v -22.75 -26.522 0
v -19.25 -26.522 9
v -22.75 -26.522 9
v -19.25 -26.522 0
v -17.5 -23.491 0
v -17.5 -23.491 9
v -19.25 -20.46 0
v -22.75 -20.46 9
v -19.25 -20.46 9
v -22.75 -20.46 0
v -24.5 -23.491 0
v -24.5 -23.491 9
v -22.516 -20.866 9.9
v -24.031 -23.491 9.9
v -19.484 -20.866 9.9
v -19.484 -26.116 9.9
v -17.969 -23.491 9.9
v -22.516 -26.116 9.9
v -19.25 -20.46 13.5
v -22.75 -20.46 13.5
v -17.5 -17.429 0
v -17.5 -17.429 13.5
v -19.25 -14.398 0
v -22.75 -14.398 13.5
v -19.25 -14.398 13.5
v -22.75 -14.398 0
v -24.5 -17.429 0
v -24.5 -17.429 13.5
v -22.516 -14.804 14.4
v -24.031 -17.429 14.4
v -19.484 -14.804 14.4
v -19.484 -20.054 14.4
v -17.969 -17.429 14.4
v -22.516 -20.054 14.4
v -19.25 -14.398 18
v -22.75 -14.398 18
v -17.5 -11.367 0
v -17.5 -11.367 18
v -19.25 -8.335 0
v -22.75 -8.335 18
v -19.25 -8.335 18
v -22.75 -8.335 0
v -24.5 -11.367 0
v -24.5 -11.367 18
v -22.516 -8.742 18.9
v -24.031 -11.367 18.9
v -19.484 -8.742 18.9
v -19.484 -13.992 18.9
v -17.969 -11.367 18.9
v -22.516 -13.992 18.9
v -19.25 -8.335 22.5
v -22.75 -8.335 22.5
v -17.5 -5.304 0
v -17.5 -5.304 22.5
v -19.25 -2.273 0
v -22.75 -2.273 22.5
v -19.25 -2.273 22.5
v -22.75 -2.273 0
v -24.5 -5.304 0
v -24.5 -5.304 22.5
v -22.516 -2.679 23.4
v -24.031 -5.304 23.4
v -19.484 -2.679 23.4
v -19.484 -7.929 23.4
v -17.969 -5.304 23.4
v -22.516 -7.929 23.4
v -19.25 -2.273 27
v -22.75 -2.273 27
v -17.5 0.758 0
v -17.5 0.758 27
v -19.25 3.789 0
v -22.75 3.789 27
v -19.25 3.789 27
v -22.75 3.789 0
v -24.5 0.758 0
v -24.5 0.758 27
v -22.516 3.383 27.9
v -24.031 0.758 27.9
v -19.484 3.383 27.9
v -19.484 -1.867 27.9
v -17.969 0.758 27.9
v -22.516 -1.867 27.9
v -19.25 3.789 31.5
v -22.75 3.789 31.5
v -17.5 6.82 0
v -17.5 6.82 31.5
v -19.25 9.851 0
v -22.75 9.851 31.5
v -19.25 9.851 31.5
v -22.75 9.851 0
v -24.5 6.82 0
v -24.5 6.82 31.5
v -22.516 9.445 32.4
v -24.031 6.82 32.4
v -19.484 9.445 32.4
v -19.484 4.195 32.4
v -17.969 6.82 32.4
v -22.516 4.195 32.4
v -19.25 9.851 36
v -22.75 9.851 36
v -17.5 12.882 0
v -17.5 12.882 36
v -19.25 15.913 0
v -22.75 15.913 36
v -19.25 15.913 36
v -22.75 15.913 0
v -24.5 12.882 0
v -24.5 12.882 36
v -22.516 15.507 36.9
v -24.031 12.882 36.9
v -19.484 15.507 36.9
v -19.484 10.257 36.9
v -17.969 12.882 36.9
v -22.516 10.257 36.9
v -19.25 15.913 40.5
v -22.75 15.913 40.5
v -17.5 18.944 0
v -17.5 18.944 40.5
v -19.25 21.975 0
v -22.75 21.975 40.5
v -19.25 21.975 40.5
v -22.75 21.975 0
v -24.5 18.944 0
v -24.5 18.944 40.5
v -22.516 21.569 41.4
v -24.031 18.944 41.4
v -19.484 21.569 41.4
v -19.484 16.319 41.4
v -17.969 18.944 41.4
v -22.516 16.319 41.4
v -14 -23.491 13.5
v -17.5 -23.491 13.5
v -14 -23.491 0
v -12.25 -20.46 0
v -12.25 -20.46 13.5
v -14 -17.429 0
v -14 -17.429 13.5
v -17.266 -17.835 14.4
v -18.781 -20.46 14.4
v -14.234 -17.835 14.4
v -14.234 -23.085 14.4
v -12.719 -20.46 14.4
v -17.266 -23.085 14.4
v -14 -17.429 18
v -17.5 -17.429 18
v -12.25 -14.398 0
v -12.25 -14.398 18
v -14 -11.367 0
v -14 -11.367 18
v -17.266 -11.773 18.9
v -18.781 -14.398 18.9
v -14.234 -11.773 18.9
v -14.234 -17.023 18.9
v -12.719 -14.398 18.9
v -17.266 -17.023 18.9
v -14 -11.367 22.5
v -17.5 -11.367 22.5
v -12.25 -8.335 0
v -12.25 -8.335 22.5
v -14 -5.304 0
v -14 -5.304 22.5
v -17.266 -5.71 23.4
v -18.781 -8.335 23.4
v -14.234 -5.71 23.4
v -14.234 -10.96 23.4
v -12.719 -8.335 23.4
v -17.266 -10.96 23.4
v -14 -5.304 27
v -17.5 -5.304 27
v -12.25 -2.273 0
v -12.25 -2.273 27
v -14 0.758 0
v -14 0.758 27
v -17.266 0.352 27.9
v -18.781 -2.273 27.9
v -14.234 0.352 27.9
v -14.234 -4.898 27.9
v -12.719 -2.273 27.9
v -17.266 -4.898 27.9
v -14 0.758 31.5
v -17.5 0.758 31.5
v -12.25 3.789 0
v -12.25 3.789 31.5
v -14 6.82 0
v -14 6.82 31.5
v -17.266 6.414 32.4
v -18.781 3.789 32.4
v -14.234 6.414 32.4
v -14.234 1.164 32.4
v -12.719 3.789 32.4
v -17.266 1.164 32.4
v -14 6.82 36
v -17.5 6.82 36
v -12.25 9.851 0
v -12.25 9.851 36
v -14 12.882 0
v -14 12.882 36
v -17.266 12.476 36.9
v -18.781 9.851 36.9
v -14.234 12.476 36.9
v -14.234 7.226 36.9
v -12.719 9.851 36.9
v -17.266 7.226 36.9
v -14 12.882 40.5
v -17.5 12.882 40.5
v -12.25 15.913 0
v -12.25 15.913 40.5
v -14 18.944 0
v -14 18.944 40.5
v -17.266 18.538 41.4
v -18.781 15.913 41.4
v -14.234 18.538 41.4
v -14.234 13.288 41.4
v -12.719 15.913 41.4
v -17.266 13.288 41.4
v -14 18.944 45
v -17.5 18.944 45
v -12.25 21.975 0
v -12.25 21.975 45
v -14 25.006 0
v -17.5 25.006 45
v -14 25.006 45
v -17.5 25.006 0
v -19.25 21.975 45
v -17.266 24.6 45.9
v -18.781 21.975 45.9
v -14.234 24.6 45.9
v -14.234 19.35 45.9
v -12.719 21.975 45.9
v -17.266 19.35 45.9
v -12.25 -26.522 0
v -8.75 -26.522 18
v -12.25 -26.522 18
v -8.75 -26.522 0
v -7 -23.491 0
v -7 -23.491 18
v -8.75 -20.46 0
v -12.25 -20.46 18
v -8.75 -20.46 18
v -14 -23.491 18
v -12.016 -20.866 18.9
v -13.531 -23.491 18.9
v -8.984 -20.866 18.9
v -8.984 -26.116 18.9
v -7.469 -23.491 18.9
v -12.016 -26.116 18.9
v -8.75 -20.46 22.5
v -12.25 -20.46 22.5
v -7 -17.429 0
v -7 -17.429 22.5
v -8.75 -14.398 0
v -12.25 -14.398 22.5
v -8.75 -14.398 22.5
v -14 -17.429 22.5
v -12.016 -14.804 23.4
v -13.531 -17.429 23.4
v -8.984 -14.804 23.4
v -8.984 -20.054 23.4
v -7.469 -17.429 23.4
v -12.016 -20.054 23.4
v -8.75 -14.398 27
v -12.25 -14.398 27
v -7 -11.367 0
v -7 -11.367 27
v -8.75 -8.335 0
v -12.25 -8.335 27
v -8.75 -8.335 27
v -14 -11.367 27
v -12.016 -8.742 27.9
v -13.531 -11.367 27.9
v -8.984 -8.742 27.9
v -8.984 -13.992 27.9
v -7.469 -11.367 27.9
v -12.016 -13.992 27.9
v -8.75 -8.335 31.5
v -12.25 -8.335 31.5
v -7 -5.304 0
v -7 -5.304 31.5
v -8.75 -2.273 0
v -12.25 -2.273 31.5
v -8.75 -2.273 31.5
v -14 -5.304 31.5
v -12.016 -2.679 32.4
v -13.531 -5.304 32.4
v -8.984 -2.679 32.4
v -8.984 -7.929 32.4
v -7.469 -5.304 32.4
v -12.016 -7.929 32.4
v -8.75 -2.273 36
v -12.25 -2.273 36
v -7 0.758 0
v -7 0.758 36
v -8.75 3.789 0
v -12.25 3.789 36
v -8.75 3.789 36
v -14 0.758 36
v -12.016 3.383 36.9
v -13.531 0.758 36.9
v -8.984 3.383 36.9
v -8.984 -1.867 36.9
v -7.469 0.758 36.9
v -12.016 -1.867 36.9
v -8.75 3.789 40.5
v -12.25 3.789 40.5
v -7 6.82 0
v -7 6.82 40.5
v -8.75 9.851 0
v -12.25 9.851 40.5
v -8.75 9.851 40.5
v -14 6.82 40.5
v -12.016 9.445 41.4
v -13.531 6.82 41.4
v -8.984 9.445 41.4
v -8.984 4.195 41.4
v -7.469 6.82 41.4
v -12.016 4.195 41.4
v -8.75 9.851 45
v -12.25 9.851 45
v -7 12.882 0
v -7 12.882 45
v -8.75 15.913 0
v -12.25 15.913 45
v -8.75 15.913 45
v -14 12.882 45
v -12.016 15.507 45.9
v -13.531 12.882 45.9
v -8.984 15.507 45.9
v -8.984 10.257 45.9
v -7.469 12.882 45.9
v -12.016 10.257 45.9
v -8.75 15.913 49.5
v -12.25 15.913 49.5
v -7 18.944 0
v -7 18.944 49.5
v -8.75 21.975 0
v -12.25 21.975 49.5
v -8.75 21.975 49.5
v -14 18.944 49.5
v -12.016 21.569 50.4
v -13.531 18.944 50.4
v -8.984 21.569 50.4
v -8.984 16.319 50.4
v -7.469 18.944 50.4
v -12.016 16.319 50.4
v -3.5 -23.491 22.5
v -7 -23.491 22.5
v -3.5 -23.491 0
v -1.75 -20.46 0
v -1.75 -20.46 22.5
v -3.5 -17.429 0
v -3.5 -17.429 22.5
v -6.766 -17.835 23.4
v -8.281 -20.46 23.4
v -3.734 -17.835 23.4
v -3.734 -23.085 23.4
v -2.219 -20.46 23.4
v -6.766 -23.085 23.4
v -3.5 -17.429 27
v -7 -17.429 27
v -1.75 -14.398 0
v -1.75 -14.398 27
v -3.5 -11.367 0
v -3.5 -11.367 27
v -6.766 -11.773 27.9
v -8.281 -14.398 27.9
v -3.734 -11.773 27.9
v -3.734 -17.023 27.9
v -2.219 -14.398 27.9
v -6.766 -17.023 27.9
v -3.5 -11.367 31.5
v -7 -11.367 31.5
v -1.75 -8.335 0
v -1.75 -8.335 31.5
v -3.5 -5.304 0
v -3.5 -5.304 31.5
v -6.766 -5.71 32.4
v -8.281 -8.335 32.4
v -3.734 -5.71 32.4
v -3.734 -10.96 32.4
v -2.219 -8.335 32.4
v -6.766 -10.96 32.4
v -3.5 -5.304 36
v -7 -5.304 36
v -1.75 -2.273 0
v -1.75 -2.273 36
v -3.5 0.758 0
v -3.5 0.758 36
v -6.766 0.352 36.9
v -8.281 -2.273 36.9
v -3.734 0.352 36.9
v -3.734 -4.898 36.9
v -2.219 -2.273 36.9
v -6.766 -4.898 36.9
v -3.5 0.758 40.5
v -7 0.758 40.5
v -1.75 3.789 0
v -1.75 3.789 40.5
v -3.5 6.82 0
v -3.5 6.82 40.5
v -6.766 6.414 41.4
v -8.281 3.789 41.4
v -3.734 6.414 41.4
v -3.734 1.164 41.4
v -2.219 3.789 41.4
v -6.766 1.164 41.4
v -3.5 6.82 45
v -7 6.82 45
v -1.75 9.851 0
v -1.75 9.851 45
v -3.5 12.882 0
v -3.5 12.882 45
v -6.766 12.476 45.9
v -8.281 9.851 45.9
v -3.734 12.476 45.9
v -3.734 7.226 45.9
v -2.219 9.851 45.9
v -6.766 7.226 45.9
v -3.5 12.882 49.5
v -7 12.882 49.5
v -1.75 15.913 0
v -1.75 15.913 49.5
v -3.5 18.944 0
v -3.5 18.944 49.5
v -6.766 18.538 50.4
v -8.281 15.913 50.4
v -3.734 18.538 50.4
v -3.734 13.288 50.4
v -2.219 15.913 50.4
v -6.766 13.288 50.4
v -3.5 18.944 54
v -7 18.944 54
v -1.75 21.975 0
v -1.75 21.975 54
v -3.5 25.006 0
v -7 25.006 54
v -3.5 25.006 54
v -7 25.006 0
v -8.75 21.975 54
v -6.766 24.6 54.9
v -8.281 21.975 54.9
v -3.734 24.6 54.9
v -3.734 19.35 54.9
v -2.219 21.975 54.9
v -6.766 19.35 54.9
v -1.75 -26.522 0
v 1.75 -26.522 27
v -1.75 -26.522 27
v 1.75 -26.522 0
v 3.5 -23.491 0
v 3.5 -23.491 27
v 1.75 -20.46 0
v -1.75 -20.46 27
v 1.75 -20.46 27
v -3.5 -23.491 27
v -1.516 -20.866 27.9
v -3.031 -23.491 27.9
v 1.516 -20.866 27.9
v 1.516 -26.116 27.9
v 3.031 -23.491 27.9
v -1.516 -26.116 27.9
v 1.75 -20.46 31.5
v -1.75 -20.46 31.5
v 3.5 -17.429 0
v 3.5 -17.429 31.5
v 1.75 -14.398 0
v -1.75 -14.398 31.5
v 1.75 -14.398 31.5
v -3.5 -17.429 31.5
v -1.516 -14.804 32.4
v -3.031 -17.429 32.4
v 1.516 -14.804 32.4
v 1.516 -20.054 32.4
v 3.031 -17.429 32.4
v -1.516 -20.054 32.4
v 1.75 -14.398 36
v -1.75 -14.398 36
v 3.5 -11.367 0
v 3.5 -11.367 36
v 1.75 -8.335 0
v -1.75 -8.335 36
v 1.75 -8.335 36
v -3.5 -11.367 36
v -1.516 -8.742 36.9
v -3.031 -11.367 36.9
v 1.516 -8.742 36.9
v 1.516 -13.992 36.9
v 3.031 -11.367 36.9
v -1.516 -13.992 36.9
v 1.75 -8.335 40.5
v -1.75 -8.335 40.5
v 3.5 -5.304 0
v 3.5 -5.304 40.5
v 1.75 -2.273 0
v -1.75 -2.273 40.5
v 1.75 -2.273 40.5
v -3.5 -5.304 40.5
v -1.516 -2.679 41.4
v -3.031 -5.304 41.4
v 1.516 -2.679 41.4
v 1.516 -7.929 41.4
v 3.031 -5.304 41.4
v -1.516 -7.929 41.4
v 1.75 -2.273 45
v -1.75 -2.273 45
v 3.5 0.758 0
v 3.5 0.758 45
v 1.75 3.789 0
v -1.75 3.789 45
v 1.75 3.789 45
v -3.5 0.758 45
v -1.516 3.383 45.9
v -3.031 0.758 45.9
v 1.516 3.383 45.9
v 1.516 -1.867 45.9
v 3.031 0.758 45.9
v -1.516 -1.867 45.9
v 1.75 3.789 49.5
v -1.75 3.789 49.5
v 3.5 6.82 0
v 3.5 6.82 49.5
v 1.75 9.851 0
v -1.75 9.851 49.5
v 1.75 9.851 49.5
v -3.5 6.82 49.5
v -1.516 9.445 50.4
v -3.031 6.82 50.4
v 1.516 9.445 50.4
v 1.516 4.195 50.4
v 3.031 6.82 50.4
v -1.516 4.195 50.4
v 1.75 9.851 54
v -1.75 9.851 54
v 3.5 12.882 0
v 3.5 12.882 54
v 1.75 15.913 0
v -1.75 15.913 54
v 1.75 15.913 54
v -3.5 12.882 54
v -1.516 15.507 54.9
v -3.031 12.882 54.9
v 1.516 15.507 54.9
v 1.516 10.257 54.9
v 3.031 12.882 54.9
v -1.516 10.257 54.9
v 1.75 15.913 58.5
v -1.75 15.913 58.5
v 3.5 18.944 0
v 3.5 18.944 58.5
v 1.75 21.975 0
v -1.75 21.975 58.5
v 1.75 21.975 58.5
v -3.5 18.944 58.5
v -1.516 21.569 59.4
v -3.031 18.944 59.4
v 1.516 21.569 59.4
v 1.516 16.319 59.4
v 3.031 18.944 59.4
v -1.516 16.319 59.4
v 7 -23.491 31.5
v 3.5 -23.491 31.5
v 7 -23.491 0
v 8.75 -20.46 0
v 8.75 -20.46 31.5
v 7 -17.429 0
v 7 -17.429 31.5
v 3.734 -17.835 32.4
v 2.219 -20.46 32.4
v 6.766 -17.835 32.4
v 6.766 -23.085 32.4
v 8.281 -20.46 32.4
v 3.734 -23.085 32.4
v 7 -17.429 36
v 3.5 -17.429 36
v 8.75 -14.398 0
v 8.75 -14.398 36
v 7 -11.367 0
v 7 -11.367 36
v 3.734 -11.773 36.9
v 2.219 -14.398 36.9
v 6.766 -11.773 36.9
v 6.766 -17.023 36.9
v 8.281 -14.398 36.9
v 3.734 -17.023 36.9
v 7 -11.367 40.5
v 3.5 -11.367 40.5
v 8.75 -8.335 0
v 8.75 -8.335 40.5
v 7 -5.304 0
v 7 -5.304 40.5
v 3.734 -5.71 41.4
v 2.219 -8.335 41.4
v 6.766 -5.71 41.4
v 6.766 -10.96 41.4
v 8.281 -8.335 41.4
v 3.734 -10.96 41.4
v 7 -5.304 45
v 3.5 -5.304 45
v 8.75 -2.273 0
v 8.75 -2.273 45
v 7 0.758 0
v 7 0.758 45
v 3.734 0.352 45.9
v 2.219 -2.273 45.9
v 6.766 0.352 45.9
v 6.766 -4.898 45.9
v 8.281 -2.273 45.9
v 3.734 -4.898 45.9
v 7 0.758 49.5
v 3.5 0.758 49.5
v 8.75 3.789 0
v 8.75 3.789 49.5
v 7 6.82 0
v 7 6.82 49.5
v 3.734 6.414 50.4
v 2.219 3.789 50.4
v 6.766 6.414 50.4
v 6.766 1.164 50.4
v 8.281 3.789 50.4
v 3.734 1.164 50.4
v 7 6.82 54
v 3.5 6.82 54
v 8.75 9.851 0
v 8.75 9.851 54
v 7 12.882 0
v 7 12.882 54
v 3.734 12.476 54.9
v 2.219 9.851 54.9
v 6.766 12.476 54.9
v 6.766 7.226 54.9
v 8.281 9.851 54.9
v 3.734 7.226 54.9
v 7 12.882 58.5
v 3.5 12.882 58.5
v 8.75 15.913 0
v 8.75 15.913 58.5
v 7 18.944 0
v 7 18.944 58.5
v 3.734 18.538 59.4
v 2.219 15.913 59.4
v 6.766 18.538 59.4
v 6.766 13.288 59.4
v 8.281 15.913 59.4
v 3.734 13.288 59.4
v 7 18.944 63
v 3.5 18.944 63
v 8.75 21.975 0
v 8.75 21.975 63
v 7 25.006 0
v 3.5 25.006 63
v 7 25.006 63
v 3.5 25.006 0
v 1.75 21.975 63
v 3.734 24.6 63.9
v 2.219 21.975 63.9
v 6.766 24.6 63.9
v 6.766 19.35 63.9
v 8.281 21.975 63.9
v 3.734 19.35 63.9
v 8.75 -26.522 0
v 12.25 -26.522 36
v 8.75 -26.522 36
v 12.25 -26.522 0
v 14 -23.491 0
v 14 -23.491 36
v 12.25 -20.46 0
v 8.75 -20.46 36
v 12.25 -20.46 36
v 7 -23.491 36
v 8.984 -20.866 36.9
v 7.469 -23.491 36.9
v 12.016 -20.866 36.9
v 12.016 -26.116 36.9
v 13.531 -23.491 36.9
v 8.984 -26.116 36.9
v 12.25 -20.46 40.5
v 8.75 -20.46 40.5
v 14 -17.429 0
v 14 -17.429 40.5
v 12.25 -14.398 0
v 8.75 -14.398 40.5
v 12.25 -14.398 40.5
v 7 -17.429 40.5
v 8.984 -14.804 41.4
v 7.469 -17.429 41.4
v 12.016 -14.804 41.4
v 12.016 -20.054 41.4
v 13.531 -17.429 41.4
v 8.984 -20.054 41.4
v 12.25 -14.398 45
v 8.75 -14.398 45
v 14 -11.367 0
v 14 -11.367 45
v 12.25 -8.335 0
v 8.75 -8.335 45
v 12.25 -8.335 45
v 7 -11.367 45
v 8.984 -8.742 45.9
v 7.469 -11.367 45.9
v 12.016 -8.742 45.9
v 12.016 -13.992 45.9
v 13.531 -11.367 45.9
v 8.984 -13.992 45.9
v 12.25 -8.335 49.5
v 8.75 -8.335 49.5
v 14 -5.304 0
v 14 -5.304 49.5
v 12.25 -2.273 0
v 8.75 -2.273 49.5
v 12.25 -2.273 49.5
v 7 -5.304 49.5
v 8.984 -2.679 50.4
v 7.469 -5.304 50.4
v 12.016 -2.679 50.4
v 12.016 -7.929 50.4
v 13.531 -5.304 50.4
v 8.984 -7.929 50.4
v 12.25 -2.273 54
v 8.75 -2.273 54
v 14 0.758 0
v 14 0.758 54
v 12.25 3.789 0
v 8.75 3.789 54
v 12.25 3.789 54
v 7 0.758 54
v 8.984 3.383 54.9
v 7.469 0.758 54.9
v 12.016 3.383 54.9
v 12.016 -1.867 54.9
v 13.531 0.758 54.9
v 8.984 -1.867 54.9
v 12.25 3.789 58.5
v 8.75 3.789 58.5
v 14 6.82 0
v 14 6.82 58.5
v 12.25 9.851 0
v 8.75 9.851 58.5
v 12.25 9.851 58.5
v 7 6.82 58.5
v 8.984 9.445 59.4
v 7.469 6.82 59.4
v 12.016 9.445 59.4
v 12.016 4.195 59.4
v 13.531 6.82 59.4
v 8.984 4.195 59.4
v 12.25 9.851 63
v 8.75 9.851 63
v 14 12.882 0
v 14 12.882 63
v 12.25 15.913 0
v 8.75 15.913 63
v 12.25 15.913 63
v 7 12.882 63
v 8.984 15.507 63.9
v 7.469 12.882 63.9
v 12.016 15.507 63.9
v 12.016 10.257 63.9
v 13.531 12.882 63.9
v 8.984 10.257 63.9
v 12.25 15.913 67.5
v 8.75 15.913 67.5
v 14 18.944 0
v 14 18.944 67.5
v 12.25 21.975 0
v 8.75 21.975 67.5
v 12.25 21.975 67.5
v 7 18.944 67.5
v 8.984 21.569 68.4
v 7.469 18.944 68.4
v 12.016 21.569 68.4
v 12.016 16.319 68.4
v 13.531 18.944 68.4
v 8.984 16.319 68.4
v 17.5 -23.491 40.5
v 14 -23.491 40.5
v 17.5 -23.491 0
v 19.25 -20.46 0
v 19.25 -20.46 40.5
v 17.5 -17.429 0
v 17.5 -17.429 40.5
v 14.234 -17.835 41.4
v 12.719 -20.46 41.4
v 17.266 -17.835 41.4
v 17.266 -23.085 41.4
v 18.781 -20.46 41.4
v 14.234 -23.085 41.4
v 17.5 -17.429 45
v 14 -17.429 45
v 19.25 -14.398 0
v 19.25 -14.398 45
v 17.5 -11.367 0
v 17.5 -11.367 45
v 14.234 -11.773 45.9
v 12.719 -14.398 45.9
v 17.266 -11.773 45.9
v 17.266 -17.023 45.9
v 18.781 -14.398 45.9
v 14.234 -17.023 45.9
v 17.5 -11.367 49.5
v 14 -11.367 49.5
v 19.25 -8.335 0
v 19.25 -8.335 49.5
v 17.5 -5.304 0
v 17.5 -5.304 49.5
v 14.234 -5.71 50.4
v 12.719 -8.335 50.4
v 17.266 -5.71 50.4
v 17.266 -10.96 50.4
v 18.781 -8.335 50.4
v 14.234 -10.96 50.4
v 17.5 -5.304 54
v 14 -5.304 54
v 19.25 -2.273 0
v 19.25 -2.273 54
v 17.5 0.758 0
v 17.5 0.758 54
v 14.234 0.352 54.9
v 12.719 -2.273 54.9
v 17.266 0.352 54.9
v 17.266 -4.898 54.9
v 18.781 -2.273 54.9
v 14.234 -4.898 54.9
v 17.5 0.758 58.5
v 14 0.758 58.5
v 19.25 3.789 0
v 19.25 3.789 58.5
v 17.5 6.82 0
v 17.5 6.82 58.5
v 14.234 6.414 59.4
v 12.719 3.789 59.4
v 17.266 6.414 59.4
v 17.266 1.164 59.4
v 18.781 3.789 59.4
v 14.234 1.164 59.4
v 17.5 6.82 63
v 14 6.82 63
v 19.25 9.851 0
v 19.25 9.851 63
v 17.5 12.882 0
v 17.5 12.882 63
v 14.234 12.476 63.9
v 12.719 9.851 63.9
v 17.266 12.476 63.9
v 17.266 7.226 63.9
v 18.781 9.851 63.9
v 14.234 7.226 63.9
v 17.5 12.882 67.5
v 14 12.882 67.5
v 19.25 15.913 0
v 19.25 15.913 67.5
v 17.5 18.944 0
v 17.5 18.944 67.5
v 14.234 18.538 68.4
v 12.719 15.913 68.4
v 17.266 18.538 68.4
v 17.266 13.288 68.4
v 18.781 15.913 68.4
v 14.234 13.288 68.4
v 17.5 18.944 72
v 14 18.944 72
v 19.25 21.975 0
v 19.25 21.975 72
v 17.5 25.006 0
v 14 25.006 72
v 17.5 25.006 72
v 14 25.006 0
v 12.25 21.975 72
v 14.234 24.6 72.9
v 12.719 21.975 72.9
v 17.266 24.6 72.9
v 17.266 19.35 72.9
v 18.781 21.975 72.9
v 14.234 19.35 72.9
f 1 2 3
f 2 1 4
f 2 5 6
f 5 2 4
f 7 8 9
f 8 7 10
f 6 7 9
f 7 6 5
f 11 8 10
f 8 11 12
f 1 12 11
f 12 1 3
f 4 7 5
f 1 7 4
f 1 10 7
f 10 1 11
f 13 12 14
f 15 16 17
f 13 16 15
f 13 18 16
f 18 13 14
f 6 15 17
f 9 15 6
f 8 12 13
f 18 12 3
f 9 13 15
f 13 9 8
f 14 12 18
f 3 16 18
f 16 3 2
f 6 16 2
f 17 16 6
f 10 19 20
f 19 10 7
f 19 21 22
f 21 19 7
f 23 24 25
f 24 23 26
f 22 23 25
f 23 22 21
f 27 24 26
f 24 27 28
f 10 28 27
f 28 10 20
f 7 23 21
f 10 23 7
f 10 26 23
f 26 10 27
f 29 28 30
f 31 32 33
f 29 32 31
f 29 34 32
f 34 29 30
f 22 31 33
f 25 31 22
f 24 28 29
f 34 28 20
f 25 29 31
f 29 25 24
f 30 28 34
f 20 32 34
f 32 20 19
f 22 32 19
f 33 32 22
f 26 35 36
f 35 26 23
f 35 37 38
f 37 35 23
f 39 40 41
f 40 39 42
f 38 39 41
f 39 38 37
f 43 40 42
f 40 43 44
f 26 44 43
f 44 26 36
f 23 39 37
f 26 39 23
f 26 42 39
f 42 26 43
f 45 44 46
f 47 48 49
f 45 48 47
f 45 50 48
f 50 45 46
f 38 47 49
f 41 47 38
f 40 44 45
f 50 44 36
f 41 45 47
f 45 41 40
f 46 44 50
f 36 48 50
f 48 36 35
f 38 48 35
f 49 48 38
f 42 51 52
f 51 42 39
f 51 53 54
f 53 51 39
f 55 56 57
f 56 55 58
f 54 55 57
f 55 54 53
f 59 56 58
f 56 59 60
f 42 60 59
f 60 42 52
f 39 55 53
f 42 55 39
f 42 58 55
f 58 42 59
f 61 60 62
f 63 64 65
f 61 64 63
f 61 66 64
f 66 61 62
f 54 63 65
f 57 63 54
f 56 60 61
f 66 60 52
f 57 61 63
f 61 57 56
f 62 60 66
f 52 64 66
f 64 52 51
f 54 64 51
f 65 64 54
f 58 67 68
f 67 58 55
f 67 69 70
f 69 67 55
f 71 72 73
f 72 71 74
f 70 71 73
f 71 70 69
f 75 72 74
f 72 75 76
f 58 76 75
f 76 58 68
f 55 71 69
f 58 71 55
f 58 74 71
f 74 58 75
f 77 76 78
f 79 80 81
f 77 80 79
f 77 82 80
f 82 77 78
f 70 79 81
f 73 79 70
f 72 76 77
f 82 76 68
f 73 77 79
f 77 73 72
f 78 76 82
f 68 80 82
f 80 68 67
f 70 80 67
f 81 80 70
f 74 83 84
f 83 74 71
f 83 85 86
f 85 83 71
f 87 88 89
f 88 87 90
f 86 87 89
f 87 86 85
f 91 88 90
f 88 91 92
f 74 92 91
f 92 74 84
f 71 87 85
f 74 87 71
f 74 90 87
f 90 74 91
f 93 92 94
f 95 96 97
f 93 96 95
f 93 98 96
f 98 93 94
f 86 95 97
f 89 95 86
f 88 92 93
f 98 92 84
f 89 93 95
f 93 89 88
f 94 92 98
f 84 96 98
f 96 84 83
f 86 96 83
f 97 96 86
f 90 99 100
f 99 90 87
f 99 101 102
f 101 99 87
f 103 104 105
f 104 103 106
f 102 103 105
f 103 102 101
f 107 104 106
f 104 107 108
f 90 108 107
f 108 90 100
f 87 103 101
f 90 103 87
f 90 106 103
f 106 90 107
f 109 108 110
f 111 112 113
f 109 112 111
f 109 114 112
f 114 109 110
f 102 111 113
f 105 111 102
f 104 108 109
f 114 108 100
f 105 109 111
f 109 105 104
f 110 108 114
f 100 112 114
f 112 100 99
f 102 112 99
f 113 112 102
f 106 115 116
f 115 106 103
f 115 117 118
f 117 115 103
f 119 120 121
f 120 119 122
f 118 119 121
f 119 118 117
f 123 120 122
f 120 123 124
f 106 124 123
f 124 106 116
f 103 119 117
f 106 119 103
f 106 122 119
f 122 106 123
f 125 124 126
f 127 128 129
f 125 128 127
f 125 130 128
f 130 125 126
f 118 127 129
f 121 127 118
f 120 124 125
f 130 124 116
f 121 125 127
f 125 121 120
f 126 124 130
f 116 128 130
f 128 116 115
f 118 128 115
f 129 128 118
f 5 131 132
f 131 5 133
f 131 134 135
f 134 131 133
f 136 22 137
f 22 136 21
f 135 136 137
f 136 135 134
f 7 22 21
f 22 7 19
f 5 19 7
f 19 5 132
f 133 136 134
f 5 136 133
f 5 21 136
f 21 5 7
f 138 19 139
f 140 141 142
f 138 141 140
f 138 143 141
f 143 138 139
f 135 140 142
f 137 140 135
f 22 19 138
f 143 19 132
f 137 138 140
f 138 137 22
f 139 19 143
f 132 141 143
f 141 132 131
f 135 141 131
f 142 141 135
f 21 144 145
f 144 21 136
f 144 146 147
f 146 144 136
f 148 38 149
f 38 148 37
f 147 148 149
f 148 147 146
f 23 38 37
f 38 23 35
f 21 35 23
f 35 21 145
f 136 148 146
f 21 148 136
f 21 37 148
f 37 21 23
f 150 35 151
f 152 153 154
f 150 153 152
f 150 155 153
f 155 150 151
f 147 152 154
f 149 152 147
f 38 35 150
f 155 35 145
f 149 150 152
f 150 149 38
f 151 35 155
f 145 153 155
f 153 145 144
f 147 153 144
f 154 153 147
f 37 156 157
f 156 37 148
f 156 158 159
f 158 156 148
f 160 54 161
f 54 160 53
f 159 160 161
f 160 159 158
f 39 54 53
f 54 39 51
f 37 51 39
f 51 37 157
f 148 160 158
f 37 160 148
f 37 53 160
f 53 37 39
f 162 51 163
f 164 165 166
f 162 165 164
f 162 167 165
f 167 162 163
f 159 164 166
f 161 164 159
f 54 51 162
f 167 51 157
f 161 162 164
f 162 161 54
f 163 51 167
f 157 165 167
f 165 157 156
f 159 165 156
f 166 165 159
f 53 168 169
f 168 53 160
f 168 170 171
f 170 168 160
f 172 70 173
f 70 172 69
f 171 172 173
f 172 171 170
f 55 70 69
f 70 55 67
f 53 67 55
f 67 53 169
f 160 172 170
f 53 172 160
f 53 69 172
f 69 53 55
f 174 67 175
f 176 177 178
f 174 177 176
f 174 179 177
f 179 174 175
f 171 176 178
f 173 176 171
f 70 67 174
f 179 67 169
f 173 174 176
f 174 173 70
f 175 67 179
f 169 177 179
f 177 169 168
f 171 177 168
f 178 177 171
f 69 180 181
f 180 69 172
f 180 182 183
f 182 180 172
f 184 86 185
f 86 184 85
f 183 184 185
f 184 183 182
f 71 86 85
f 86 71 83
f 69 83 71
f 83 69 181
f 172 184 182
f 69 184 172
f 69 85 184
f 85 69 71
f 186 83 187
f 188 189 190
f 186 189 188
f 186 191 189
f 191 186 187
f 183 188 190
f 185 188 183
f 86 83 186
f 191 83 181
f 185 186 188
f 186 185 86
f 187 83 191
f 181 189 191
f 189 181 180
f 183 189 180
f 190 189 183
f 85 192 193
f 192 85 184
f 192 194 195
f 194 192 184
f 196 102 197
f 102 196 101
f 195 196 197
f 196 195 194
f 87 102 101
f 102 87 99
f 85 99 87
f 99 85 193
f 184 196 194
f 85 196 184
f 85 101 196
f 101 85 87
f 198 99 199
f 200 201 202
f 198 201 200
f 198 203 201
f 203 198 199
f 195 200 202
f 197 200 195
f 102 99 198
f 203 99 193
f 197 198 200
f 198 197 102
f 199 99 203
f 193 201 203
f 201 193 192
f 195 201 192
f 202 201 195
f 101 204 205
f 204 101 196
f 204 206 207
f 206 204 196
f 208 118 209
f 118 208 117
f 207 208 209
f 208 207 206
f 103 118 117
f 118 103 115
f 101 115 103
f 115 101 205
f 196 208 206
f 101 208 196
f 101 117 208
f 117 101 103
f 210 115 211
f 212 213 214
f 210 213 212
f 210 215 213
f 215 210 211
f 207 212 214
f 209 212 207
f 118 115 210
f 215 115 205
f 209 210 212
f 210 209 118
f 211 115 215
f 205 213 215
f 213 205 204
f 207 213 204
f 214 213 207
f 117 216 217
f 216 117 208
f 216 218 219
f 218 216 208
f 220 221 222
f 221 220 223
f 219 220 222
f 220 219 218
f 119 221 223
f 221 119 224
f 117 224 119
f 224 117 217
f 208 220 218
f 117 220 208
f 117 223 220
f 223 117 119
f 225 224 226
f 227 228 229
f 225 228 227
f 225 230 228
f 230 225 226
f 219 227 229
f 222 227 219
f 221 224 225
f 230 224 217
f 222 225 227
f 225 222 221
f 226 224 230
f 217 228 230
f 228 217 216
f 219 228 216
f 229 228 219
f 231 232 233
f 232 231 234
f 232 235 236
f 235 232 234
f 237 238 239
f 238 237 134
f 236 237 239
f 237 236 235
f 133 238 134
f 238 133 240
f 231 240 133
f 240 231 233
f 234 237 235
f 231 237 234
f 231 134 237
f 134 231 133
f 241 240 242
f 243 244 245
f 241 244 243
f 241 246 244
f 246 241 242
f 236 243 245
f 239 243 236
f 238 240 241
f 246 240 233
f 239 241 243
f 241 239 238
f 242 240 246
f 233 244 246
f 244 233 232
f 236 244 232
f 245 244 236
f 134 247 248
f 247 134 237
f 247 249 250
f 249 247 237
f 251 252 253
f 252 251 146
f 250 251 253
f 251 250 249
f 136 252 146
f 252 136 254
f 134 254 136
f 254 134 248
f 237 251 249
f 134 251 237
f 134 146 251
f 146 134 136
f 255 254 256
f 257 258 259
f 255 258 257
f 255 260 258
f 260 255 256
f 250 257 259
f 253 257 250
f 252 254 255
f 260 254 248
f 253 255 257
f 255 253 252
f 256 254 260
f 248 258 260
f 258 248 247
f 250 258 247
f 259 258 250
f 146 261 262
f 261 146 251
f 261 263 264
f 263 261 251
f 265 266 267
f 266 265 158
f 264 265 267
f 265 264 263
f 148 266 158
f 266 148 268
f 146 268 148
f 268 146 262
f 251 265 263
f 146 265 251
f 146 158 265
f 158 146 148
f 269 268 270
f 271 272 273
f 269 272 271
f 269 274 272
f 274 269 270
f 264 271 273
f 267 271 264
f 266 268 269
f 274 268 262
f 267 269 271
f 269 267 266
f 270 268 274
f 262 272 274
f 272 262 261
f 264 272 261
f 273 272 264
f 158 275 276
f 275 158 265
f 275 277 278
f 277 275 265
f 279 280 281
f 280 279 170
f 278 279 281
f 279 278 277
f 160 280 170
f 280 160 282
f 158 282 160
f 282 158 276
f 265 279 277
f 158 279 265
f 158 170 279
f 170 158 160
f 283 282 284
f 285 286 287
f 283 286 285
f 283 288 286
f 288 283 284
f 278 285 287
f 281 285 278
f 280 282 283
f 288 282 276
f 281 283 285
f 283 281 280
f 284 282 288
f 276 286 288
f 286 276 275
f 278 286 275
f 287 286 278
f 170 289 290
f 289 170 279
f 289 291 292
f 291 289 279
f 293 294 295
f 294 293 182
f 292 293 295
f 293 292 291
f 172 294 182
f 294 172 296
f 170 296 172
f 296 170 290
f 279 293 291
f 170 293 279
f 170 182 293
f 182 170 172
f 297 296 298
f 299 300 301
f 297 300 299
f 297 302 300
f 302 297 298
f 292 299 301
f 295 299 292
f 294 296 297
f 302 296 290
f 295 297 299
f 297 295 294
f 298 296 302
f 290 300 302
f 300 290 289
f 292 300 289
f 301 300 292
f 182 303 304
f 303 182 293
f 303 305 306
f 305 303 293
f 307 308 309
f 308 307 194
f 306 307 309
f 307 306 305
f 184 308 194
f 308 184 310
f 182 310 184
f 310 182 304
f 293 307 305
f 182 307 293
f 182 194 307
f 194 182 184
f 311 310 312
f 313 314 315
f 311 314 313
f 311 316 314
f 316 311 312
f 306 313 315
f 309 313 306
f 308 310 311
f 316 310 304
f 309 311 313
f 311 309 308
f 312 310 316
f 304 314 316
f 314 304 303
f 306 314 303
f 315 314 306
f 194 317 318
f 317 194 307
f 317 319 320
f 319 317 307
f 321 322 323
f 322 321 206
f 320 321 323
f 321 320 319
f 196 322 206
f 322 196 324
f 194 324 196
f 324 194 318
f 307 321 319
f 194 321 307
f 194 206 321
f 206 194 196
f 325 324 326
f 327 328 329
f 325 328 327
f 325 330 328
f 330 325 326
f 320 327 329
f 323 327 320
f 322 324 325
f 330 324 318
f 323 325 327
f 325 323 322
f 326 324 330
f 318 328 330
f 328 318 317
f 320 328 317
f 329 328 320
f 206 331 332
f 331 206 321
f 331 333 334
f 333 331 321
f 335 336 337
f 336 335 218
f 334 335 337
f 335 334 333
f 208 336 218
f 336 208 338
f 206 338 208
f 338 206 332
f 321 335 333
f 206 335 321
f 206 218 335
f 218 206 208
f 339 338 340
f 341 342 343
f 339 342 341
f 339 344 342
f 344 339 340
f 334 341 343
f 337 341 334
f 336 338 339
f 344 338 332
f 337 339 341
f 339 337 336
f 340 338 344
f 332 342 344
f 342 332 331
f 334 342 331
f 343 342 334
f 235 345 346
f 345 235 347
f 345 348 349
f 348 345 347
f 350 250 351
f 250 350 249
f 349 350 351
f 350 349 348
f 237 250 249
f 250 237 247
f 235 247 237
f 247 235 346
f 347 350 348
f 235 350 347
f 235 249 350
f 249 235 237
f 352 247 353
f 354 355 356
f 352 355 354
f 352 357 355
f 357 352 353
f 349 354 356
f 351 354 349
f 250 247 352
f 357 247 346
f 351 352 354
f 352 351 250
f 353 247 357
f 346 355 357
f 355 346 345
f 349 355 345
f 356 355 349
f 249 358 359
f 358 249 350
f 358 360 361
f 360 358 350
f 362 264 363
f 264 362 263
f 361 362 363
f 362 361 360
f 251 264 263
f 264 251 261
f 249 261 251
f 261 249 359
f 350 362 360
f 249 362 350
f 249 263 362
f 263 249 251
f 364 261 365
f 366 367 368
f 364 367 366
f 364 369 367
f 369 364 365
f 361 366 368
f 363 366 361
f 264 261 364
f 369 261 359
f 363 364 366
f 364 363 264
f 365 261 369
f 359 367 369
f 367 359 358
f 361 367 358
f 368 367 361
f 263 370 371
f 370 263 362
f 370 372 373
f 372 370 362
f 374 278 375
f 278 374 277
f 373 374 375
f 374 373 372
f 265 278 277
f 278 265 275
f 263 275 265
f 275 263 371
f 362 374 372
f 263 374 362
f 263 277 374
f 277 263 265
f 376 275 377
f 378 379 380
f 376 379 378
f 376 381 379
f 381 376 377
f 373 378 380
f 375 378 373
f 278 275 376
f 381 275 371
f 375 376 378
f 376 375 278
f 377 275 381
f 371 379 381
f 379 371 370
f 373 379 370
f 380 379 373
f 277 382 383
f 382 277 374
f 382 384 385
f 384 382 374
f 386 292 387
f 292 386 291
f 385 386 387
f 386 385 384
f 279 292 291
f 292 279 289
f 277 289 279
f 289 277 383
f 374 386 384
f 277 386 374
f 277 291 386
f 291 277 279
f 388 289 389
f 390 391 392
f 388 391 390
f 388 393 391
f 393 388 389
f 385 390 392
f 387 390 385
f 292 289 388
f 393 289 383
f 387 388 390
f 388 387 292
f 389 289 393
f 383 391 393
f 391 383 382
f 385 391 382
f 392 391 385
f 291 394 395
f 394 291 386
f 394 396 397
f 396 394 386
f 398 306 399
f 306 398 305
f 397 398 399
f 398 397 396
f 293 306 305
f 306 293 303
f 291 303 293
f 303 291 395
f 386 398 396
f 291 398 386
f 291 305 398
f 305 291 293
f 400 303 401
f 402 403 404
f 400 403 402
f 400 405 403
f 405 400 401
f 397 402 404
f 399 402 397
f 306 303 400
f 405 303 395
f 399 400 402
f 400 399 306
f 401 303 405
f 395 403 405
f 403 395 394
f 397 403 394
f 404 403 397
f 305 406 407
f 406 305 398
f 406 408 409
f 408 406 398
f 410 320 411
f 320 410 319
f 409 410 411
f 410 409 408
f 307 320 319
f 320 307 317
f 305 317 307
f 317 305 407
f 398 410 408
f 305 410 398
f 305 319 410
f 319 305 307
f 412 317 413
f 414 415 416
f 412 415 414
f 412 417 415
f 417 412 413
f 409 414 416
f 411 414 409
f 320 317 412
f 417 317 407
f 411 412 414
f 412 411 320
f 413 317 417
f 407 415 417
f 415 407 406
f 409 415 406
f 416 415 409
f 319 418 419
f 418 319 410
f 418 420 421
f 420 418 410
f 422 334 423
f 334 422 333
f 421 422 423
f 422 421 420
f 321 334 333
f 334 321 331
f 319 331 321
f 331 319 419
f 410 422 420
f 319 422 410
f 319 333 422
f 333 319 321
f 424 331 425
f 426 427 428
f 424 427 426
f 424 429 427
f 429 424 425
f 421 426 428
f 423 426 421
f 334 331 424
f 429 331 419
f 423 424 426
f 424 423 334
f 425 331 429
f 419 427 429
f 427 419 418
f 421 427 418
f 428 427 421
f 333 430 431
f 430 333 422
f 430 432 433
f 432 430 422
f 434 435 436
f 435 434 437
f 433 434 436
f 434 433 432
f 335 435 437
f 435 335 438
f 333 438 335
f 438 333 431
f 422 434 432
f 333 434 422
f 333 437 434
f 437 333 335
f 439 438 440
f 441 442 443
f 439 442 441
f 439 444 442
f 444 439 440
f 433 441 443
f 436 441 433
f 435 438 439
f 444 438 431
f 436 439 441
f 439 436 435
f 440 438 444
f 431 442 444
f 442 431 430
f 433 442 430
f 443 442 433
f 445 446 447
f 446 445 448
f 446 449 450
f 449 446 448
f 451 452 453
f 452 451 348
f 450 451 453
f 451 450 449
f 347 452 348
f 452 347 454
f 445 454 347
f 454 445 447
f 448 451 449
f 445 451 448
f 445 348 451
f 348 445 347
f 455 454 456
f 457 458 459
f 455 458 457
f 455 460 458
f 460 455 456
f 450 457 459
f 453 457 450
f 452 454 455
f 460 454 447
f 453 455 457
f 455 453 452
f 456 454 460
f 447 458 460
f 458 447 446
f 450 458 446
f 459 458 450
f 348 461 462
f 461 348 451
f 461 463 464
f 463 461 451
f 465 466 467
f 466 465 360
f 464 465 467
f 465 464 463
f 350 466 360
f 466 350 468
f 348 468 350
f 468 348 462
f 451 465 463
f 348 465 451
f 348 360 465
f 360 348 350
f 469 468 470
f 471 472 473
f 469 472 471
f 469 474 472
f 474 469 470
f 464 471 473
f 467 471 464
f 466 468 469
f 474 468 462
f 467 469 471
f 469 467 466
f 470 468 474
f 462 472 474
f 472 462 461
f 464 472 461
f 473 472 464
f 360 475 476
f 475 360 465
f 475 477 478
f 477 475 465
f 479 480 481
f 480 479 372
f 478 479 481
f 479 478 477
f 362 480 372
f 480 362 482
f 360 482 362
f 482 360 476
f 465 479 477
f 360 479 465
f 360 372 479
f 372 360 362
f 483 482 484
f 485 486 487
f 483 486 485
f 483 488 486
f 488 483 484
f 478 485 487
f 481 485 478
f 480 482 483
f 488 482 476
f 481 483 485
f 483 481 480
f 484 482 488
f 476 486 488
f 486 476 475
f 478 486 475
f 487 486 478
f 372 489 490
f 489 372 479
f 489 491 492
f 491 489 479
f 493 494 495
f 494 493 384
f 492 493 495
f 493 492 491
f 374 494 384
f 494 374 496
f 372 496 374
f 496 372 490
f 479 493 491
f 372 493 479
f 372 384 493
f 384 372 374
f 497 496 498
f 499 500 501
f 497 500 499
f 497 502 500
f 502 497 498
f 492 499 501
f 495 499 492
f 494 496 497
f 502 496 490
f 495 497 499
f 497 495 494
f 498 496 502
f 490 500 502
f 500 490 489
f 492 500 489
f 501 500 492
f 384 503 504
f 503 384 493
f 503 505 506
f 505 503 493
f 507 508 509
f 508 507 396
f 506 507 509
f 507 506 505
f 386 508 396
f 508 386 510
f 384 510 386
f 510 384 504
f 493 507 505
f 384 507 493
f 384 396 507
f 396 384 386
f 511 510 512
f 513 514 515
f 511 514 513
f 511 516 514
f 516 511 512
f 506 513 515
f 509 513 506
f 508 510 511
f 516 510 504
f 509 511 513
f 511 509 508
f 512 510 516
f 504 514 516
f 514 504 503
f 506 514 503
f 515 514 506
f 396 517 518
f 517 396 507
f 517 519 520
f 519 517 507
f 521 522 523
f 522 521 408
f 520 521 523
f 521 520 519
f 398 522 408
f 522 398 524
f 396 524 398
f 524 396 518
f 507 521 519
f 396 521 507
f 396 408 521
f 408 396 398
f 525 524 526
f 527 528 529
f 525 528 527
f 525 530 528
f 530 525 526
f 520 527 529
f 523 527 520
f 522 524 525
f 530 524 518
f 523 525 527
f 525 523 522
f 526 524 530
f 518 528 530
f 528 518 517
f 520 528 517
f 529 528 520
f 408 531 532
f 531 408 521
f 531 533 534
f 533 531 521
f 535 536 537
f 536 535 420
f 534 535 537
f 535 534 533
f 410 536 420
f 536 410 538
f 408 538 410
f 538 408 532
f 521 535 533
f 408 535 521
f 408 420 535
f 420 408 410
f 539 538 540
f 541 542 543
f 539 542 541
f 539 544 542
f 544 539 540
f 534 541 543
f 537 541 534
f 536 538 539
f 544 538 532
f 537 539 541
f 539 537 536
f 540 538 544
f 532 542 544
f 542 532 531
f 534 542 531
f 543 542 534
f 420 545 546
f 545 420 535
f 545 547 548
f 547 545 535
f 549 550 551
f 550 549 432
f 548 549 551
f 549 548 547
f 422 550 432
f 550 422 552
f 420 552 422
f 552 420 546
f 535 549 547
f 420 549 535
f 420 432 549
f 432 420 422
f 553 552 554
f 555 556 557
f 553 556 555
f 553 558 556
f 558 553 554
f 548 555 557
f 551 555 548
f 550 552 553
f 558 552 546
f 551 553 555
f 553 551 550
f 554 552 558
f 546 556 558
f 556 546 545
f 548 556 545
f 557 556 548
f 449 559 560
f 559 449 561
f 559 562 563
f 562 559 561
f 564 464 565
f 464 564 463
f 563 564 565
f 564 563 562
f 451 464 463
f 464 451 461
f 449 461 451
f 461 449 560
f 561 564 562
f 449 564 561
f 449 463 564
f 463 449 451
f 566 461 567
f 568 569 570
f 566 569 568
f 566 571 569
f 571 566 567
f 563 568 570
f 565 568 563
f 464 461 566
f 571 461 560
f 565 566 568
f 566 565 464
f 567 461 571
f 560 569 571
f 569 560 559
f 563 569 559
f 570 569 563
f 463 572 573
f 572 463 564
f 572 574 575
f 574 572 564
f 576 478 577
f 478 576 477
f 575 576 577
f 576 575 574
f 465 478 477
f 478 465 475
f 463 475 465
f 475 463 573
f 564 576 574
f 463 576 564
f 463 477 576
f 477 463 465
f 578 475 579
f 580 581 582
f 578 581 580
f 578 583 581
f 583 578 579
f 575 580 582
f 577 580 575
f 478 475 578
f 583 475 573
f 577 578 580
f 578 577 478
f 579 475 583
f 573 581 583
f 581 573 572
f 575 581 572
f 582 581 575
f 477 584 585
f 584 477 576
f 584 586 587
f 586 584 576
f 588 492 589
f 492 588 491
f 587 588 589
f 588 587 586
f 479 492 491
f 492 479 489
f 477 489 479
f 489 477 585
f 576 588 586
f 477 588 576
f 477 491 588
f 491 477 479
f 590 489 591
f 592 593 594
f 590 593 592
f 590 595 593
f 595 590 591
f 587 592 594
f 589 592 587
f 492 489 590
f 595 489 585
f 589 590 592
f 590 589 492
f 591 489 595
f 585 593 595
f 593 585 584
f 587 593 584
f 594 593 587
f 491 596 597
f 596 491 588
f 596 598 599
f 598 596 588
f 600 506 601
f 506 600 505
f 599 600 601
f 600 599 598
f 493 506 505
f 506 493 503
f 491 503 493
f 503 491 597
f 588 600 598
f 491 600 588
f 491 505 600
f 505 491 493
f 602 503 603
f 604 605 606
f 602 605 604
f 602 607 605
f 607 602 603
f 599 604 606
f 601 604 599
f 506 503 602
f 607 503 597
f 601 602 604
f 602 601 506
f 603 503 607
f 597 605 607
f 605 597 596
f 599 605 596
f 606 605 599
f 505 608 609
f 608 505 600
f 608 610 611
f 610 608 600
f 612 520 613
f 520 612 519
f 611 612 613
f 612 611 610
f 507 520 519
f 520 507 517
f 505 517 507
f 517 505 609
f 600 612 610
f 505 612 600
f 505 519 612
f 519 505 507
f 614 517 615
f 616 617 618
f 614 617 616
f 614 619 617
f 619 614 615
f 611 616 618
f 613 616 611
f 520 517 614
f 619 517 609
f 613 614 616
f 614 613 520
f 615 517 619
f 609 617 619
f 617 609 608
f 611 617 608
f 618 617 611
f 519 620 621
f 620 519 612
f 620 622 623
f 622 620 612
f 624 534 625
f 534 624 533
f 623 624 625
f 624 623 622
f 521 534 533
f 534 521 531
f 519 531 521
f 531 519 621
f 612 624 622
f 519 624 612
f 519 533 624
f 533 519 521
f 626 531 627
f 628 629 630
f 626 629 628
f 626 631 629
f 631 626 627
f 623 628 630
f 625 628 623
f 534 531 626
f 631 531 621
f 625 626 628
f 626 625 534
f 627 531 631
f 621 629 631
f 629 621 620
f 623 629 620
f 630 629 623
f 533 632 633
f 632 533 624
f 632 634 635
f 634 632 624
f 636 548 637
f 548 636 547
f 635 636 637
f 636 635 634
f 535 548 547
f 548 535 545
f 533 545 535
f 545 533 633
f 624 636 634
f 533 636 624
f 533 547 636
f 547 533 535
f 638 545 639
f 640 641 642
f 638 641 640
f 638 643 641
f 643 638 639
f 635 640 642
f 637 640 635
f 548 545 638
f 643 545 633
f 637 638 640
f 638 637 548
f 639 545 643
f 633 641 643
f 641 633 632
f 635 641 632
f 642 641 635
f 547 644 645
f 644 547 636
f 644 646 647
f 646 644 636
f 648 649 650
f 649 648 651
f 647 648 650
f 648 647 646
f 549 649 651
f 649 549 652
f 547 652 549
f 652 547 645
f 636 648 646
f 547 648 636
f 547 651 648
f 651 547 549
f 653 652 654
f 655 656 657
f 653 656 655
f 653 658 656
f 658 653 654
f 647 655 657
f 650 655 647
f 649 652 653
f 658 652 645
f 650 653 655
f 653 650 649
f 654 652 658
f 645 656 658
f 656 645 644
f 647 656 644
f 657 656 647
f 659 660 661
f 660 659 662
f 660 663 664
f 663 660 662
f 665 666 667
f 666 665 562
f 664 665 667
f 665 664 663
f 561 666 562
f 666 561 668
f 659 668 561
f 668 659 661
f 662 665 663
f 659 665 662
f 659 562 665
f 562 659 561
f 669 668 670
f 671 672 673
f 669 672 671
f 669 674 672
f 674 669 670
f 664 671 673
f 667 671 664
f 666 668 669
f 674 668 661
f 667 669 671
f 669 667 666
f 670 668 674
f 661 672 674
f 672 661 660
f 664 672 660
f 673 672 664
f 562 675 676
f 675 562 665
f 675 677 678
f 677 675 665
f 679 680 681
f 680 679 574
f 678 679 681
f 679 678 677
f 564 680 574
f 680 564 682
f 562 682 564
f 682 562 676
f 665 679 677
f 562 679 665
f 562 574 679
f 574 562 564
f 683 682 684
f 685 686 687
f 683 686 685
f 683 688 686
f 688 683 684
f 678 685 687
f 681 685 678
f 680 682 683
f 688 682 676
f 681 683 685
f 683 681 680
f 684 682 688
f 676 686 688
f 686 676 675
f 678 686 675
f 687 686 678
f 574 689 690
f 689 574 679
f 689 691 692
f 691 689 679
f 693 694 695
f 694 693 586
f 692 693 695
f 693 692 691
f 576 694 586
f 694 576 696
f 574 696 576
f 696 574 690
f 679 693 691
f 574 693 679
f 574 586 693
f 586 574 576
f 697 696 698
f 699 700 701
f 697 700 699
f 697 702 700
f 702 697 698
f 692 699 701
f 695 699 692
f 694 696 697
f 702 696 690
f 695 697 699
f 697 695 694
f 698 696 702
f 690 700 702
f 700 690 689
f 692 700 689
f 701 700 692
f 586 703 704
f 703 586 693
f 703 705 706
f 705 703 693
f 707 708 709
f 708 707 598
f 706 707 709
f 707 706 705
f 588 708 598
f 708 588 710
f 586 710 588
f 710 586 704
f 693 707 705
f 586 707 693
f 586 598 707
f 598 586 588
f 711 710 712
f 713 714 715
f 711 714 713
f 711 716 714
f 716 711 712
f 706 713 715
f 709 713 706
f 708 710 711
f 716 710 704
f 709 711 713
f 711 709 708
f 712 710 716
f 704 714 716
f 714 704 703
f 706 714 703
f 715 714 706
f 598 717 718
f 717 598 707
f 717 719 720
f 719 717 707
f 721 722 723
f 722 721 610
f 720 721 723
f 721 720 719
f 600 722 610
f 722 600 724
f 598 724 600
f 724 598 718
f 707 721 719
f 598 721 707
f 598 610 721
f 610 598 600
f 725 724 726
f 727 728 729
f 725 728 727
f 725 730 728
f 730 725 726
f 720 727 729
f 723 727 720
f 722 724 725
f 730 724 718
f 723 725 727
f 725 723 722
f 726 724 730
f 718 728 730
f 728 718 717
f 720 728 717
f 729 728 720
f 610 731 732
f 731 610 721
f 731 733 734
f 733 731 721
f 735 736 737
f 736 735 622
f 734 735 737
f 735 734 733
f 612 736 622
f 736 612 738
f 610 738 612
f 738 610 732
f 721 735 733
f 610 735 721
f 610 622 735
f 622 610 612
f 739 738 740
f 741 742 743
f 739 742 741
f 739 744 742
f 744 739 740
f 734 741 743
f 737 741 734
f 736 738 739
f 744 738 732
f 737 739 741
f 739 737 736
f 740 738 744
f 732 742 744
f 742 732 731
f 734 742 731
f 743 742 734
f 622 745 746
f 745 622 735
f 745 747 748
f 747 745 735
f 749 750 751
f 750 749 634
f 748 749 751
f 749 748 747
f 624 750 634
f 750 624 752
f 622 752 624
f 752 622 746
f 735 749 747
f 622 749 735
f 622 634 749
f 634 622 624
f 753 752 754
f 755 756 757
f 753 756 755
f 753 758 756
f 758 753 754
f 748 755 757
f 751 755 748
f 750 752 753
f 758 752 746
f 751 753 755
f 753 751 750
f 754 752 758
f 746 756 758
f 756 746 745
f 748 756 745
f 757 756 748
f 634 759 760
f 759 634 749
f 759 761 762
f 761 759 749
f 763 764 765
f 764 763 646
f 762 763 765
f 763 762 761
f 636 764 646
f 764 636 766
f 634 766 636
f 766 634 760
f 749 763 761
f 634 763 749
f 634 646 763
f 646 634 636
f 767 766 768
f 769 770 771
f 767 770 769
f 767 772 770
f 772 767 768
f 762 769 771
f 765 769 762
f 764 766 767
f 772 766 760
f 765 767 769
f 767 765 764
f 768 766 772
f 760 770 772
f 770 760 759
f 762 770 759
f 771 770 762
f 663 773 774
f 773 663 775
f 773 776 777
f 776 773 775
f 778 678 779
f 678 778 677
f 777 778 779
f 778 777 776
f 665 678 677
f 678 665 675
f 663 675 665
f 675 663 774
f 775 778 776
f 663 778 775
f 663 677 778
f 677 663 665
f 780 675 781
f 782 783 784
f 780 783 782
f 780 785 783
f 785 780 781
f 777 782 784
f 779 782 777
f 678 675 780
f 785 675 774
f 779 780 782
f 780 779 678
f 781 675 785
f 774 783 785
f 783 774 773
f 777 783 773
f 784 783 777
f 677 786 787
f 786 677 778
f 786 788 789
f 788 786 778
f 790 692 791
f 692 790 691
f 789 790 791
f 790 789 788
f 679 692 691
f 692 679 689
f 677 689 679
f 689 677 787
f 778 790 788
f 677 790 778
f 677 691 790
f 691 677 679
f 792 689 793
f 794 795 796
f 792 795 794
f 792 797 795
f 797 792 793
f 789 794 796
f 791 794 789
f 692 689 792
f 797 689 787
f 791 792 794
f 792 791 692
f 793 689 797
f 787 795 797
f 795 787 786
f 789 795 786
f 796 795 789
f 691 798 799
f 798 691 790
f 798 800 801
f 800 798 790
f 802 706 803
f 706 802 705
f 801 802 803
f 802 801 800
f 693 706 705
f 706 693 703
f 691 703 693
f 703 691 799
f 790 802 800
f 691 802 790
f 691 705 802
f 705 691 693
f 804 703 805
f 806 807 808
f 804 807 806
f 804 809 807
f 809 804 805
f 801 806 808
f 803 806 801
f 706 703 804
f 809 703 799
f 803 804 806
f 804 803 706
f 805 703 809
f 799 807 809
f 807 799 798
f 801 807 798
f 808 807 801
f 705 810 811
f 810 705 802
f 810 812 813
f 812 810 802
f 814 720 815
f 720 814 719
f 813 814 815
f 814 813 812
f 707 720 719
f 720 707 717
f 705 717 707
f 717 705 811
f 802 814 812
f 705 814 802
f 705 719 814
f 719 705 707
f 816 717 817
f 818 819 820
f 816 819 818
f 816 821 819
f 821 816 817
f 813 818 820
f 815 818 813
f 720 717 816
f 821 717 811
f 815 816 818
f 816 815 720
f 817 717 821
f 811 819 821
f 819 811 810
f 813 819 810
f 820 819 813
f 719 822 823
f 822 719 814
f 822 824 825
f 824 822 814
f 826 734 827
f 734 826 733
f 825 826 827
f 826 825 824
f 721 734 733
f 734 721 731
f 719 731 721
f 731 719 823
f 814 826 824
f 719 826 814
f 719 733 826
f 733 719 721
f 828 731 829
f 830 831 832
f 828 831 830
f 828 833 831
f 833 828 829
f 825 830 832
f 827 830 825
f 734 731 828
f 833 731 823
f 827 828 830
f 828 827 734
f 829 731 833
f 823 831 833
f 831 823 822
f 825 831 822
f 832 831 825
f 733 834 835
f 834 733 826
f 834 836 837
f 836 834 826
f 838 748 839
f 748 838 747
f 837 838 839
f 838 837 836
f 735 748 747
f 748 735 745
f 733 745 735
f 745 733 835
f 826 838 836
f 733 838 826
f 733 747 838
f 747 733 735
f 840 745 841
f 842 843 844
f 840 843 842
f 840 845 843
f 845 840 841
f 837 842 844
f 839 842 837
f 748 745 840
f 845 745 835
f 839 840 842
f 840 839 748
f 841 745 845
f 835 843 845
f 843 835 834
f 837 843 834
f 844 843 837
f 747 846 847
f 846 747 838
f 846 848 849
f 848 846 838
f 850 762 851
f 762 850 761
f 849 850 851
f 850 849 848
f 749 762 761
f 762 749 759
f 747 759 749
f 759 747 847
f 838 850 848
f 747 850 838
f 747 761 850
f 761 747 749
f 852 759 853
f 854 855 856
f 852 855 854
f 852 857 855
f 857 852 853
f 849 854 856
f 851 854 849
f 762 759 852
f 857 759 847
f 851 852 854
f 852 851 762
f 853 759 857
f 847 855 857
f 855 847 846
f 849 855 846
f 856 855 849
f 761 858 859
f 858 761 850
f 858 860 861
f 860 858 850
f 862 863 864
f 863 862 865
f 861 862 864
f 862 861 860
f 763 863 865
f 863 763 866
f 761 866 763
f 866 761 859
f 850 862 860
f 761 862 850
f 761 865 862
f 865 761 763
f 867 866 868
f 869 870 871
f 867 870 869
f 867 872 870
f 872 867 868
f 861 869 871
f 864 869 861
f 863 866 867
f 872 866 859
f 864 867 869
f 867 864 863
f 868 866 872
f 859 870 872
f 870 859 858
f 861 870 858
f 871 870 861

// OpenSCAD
tilesX=8;
tilesY=8;
tileRadius=2;

tileSpacing=tileRadius/3;
outRadius= tileRadius+tileSpacing /2;
inRadius = outRadius * (sqrt(3)/2);

module tile(h) {
	$fn=6; //resolution des cercles
	cylinder(baseHeight+h, outRadius, outRadius);
	translate([0,0,baseHeight+h])
		color([1-h,0,0]) cylinder(.6, outRadius, inRadius);
}

module map(w,h) {
	
	minTilesY=1;
	maxTilesY=12;
	lastTilesY=0;
	
	for(x=[0:tilesX-1]) {

		curTilesY = rands(minTilesY, maxTilesY,1)[0];
		
		for(y=[0:tilesY-1]) {
	   
			randHeight = rands(0,100,1)[0];
			randHole = rands(0,1,1)[0];
			  
			if(randHole>0){
				offsetPos = (x%2) != 0 ? inRadius : 0 ;
				translate([
					x * outRadius * 1.5,
					y * inRadius * 2 + offsetPos,
					0])
				  //tile( x*2+y*2 + (randHeight/20));
					tile( (x*3)+(y*3));
			}
		}
	}
}

baseHeight=6;
baseDiameter=((tilesX*1.4)*(tileRadius*2));

module stamp() {
	$fn=100;
	d=(tilesX*1.4)*(tileRadius*2);
	ofX=((tilesX-1)*(outRadius*2))/2;
	ofY=((tilesY-1)*(inRadius*2.5))/2;;
	//translate([outRadius,inRadius,0])
	union() {
		//translate([0,0,-2])
			//cylinder(baseHeight-0.8, d/2,d/2);
		translate([-ofX,-ofY,0])
			translate([outRadius,inRadius,0])
				map(tilesX,tilesY);
	}
	echo(d);
}

scale(1.5)
	stamp();
